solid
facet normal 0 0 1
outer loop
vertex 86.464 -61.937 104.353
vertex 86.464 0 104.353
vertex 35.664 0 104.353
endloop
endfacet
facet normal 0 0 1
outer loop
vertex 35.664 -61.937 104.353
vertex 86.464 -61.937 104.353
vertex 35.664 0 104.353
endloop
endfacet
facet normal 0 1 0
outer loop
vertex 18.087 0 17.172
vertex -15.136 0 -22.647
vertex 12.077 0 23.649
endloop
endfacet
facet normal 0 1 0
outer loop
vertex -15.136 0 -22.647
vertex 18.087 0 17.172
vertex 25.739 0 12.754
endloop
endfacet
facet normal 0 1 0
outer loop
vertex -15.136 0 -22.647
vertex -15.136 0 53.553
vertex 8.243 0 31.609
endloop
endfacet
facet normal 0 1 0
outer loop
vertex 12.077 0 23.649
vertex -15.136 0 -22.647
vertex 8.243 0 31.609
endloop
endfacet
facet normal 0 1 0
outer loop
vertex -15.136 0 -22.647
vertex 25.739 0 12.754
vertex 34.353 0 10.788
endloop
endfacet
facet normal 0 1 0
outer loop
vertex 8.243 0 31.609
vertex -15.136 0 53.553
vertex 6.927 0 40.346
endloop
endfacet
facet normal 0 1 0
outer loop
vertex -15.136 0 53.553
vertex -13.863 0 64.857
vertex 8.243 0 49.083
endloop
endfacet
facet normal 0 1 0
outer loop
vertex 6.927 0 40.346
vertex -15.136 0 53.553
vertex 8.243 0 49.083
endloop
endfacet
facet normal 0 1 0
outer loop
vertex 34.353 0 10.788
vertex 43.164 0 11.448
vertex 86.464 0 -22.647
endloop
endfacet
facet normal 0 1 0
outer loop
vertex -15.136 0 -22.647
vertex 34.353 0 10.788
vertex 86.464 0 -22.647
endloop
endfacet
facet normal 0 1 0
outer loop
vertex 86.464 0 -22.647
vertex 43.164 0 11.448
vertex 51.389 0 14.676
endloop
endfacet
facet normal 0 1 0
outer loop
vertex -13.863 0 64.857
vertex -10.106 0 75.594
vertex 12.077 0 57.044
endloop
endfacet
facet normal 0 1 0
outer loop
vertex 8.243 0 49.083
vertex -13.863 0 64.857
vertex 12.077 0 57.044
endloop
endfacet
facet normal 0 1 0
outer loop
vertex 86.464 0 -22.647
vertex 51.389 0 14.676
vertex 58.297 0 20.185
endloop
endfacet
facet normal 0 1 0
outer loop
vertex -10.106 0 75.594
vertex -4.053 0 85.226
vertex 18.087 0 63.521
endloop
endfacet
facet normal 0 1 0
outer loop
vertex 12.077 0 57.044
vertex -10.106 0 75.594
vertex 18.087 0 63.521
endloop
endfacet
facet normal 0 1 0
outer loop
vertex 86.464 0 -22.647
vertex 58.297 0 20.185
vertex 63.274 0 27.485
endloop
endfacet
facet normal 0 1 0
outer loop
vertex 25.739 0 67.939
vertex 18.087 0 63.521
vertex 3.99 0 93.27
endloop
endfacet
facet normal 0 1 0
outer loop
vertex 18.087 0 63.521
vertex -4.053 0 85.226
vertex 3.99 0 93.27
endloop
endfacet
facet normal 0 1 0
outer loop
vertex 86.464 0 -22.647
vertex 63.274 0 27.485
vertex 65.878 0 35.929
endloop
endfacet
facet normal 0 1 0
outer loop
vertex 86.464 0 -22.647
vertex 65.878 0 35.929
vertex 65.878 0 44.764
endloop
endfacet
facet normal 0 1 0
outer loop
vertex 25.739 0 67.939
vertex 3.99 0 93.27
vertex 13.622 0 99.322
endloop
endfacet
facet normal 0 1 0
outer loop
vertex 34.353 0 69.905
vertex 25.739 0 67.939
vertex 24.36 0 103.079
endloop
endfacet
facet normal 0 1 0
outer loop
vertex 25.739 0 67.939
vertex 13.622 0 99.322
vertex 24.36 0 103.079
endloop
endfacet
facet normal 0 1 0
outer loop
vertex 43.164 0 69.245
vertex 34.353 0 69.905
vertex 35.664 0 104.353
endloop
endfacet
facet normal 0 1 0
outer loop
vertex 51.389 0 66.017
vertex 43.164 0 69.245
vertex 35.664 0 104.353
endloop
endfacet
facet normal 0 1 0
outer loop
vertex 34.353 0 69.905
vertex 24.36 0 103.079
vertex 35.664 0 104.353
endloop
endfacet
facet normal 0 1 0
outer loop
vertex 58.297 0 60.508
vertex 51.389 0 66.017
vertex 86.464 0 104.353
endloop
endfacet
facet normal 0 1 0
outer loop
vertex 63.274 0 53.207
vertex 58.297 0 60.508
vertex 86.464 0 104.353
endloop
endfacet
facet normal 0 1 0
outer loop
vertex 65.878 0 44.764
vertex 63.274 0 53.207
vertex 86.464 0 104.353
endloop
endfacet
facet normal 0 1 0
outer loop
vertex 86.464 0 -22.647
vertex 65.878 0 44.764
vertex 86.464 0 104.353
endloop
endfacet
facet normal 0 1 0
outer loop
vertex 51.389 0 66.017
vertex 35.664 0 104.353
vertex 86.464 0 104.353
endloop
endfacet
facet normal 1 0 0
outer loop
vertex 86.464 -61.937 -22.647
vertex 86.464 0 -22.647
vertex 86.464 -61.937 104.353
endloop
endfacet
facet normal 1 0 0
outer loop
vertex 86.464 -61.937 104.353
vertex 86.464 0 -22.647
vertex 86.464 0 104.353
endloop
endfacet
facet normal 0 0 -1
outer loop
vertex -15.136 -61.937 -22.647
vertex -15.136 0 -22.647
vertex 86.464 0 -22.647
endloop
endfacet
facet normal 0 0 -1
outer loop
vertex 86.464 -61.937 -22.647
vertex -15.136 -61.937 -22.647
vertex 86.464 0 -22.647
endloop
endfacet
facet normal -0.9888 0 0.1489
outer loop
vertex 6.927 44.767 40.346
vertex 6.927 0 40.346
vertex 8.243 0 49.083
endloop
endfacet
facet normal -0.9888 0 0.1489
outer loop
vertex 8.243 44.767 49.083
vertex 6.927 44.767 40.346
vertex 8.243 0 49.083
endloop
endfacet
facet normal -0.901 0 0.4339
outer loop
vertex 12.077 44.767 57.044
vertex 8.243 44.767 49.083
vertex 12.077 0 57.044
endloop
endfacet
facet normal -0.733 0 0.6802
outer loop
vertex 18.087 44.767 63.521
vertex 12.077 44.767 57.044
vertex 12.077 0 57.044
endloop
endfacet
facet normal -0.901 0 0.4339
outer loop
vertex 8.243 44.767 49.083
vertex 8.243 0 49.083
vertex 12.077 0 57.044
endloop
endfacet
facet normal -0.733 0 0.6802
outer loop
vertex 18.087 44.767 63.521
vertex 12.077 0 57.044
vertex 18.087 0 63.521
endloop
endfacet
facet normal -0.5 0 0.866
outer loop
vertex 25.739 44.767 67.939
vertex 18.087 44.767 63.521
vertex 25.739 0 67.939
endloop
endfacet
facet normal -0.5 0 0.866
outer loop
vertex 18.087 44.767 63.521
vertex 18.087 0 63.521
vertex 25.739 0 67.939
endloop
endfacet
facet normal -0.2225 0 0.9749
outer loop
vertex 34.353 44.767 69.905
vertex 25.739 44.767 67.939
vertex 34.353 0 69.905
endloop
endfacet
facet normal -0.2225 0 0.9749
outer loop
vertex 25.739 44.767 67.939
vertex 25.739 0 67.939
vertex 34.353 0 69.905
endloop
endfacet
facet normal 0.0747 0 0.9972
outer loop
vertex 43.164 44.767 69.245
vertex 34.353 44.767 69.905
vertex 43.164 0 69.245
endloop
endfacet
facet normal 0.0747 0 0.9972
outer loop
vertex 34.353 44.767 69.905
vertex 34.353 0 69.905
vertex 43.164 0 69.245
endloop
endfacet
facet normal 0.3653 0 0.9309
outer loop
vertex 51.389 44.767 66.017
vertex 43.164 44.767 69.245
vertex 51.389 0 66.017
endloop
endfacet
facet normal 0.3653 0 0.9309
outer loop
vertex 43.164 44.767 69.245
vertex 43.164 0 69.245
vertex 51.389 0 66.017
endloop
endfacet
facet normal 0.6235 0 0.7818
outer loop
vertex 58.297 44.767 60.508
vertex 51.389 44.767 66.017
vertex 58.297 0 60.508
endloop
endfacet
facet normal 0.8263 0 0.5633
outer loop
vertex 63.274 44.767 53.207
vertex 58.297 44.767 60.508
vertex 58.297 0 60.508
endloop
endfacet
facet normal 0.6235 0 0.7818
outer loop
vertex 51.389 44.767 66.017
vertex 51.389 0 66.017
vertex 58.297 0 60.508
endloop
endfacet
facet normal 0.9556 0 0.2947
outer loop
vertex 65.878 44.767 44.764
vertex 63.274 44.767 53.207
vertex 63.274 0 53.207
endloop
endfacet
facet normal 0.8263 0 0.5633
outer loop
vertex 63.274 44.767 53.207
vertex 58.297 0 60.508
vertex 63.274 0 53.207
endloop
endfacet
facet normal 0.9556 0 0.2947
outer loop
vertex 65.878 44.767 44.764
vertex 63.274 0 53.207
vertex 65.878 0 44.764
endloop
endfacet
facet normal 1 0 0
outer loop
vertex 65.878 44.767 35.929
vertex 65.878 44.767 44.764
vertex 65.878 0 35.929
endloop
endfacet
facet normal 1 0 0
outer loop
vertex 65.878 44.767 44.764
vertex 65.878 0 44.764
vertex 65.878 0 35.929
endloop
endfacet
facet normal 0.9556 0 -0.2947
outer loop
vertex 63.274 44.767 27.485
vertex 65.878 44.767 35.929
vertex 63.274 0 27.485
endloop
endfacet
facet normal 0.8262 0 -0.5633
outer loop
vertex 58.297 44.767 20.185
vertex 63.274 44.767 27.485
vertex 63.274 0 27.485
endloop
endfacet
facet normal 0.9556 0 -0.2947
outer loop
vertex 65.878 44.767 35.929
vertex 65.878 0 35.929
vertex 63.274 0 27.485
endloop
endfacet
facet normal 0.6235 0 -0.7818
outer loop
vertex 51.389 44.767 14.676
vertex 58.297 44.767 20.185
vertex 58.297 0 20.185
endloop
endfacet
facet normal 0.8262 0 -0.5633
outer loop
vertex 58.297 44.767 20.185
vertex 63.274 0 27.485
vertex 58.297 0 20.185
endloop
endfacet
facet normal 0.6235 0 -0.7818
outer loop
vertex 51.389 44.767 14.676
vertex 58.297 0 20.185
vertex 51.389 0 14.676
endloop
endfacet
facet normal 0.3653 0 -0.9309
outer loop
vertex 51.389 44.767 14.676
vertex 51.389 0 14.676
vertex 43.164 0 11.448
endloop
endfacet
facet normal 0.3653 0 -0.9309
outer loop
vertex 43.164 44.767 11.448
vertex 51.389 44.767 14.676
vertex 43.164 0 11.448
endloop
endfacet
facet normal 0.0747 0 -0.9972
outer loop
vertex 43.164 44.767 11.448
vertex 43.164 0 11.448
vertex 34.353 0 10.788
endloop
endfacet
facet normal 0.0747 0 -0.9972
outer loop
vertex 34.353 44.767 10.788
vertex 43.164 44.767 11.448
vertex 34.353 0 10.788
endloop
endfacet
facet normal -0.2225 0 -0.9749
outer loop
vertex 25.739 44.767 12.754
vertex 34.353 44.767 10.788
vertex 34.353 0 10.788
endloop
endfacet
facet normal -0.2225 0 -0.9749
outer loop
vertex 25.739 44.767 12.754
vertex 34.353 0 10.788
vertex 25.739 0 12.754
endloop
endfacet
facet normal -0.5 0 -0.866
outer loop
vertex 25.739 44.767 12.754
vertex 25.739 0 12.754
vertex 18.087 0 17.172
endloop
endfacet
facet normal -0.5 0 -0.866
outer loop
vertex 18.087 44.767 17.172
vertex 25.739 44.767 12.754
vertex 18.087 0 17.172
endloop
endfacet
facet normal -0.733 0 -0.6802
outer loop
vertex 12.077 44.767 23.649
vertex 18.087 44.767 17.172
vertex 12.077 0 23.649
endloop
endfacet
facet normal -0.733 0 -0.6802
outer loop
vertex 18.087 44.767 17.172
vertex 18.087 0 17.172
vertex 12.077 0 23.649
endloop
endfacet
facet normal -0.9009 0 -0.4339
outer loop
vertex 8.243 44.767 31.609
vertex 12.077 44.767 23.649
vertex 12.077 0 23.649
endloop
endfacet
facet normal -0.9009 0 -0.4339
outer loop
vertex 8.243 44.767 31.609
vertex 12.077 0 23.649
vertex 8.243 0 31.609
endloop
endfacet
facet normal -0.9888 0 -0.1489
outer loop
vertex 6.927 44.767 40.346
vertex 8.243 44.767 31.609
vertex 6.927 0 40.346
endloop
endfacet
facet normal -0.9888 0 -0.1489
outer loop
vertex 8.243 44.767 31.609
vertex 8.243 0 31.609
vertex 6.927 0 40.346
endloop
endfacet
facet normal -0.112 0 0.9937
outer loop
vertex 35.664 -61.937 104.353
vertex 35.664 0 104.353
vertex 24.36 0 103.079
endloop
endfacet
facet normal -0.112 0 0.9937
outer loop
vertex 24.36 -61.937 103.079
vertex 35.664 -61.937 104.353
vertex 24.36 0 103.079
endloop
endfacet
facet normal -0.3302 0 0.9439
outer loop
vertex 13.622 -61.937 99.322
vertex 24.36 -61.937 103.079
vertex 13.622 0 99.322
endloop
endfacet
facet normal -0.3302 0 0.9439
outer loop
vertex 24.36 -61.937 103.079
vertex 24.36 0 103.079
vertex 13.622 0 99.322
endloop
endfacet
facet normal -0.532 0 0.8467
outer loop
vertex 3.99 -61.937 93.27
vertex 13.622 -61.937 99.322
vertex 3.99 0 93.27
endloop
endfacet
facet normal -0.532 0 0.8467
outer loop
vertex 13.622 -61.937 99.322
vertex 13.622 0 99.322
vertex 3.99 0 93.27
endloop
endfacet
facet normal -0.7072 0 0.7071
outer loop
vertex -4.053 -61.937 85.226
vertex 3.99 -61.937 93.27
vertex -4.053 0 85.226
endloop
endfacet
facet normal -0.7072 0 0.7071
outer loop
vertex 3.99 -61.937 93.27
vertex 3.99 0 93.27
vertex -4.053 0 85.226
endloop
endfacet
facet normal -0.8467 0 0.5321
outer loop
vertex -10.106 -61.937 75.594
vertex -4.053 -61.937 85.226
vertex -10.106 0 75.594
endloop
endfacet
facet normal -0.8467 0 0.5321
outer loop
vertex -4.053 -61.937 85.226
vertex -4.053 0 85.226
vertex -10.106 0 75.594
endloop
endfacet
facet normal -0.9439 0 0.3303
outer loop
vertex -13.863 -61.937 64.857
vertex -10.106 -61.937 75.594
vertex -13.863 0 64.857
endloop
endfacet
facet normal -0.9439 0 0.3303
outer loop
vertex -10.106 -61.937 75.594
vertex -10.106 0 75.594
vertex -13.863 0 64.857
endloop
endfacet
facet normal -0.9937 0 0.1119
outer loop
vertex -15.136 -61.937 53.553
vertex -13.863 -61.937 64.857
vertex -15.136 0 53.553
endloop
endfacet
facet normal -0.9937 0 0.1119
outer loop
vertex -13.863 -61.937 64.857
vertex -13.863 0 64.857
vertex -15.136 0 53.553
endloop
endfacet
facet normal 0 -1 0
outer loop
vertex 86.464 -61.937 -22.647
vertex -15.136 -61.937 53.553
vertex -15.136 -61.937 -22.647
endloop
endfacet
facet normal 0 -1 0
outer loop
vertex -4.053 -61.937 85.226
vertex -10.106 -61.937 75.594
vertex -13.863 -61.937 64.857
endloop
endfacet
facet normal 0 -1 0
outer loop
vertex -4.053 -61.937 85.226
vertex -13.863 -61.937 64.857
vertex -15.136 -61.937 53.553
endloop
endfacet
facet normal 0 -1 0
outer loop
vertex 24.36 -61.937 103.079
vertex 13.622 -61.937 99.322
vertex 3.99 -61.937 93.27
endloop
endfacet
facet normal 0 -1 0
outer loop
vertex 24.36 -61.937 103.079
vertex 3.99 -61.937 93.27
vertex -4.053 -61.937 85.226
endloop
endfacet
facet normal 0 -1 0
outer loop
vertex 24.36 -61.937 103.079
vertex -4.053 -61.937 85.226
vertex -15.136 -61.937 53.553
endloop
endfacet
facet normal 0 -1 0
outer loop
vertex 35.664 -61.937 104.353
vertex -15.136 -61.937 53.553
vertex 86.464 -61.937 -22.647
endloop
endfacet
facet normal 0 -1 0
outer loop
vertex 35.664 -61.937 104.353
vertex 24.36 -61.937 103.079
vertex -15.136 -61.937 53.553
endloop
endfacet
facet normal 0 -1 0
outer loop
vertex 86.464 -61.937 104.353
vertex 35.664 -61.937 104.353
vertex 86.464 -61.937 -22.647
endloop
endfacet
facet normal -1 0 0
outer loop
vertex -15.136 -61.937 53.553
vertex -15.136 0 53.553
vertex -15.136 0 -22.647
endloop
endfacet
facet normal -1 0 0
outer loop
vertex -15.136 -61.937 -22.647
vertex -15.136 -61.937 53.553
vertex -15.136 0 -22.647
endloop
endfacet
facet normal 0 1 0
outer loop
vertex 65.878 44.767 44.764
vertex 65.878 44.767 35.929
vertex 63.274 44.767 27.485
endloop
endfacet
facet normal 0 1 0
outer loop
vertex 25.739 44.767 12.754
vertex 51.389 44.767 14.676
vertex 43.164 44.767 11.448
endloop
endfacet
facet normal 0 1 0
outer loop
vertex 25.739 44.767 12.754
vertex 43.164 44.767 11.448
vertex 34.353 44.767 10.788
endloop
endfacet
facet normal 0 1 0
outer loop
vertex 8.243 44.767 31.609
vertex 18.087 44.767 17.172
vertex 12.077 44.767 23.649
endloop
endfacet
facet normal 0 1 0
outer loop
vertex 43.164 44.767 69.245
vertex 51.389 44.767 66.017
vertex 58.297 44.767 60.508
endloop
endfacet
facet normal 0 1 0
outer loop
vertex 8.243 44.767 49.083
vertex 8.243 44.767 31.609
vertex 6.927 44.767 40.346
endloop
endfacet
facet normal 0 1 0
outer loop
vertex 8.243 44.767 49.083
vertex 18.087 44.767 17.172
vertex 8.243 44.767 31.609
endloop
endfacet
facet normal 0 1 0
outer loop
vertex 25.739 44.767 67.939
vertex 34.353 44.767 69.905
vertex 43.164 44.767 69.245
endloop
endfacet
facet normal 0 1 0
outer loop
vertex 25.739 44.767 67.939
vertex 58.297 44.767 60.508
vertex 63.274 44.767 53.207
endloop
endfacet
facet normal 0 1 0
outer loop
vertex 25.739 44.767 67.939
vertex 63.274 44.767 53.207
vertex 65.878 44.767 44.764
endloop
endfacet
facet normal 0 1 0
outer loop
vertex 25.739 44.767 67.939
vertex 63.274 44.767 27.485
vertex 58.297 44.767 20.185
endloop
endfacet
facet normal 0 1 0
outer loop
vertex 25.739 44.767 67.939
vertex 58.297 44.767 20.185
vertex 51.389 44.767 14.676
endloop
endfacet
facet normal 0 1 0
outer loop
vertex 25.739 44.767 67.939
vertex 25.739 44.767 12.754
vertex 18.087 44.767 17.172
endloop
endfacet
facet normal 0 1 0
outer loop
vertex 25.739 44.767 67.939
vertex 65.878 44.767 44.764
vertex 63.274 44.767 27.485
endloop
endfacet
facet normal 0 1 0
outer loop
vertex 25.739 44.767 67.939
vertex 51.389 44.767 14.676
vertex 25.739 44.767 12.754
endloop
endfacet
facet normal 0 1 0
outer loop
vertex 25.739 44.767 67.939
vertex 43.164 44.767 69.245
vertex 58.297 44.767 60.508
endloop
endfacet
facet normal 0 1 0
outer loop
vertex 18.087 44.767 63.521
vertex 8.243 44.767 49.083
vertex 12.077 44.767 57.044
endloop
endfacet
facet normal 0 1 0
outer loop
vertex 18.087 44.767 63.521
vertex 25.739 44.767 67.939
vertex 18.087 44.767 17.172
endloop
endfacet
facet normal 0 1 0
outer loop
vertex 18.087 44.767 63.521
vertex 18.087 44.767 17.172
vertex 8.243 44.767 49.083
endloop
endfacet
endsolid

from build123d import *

# Parameters (mm, degrees)
F1_DEPTH = 61.9365051389
F2_R     = 29.6414431948
F3_DEPTH = 44.7673946619


with BuildPart() as f1:
    # F0 (on Front) → F1 (new body)
    with BuildSketch(Plane.XZ):
        with BuildLine():
            Line((86.4637133837, 104.3530513048), (35.6637133837, 104.3530513048))
            ThreePointArc((35.6637133837, 104.3530513048), (-0.2573111006, 89.4740757891), (-15.1362866163, 53.5530513048))
            Line((-15.1362866163, 53.5530513048), (-15.1362866163, -22.6469486952))
            Line((-15.1362866163, -22.6469486952), (86.4637133837, -22.6469486952))
            Line((86.4637133837, -22.6469486952), (86.4637133837, 104.3530513048))
        make_face()
    extrude(amount=F1_DEPTH)

    # F2 (on face) → F3 (join)
    with BuildSketch(Plane(origin=(0, 0, 0), x_dir=(-1, 0, 0), z_dir=(0, 1, 0))):
        with Locations((-36.5680158138, 40.3463989496)):
            Circle(F2_R)
    extrude(amount=F3_DEPTH)


solid = f1.part
